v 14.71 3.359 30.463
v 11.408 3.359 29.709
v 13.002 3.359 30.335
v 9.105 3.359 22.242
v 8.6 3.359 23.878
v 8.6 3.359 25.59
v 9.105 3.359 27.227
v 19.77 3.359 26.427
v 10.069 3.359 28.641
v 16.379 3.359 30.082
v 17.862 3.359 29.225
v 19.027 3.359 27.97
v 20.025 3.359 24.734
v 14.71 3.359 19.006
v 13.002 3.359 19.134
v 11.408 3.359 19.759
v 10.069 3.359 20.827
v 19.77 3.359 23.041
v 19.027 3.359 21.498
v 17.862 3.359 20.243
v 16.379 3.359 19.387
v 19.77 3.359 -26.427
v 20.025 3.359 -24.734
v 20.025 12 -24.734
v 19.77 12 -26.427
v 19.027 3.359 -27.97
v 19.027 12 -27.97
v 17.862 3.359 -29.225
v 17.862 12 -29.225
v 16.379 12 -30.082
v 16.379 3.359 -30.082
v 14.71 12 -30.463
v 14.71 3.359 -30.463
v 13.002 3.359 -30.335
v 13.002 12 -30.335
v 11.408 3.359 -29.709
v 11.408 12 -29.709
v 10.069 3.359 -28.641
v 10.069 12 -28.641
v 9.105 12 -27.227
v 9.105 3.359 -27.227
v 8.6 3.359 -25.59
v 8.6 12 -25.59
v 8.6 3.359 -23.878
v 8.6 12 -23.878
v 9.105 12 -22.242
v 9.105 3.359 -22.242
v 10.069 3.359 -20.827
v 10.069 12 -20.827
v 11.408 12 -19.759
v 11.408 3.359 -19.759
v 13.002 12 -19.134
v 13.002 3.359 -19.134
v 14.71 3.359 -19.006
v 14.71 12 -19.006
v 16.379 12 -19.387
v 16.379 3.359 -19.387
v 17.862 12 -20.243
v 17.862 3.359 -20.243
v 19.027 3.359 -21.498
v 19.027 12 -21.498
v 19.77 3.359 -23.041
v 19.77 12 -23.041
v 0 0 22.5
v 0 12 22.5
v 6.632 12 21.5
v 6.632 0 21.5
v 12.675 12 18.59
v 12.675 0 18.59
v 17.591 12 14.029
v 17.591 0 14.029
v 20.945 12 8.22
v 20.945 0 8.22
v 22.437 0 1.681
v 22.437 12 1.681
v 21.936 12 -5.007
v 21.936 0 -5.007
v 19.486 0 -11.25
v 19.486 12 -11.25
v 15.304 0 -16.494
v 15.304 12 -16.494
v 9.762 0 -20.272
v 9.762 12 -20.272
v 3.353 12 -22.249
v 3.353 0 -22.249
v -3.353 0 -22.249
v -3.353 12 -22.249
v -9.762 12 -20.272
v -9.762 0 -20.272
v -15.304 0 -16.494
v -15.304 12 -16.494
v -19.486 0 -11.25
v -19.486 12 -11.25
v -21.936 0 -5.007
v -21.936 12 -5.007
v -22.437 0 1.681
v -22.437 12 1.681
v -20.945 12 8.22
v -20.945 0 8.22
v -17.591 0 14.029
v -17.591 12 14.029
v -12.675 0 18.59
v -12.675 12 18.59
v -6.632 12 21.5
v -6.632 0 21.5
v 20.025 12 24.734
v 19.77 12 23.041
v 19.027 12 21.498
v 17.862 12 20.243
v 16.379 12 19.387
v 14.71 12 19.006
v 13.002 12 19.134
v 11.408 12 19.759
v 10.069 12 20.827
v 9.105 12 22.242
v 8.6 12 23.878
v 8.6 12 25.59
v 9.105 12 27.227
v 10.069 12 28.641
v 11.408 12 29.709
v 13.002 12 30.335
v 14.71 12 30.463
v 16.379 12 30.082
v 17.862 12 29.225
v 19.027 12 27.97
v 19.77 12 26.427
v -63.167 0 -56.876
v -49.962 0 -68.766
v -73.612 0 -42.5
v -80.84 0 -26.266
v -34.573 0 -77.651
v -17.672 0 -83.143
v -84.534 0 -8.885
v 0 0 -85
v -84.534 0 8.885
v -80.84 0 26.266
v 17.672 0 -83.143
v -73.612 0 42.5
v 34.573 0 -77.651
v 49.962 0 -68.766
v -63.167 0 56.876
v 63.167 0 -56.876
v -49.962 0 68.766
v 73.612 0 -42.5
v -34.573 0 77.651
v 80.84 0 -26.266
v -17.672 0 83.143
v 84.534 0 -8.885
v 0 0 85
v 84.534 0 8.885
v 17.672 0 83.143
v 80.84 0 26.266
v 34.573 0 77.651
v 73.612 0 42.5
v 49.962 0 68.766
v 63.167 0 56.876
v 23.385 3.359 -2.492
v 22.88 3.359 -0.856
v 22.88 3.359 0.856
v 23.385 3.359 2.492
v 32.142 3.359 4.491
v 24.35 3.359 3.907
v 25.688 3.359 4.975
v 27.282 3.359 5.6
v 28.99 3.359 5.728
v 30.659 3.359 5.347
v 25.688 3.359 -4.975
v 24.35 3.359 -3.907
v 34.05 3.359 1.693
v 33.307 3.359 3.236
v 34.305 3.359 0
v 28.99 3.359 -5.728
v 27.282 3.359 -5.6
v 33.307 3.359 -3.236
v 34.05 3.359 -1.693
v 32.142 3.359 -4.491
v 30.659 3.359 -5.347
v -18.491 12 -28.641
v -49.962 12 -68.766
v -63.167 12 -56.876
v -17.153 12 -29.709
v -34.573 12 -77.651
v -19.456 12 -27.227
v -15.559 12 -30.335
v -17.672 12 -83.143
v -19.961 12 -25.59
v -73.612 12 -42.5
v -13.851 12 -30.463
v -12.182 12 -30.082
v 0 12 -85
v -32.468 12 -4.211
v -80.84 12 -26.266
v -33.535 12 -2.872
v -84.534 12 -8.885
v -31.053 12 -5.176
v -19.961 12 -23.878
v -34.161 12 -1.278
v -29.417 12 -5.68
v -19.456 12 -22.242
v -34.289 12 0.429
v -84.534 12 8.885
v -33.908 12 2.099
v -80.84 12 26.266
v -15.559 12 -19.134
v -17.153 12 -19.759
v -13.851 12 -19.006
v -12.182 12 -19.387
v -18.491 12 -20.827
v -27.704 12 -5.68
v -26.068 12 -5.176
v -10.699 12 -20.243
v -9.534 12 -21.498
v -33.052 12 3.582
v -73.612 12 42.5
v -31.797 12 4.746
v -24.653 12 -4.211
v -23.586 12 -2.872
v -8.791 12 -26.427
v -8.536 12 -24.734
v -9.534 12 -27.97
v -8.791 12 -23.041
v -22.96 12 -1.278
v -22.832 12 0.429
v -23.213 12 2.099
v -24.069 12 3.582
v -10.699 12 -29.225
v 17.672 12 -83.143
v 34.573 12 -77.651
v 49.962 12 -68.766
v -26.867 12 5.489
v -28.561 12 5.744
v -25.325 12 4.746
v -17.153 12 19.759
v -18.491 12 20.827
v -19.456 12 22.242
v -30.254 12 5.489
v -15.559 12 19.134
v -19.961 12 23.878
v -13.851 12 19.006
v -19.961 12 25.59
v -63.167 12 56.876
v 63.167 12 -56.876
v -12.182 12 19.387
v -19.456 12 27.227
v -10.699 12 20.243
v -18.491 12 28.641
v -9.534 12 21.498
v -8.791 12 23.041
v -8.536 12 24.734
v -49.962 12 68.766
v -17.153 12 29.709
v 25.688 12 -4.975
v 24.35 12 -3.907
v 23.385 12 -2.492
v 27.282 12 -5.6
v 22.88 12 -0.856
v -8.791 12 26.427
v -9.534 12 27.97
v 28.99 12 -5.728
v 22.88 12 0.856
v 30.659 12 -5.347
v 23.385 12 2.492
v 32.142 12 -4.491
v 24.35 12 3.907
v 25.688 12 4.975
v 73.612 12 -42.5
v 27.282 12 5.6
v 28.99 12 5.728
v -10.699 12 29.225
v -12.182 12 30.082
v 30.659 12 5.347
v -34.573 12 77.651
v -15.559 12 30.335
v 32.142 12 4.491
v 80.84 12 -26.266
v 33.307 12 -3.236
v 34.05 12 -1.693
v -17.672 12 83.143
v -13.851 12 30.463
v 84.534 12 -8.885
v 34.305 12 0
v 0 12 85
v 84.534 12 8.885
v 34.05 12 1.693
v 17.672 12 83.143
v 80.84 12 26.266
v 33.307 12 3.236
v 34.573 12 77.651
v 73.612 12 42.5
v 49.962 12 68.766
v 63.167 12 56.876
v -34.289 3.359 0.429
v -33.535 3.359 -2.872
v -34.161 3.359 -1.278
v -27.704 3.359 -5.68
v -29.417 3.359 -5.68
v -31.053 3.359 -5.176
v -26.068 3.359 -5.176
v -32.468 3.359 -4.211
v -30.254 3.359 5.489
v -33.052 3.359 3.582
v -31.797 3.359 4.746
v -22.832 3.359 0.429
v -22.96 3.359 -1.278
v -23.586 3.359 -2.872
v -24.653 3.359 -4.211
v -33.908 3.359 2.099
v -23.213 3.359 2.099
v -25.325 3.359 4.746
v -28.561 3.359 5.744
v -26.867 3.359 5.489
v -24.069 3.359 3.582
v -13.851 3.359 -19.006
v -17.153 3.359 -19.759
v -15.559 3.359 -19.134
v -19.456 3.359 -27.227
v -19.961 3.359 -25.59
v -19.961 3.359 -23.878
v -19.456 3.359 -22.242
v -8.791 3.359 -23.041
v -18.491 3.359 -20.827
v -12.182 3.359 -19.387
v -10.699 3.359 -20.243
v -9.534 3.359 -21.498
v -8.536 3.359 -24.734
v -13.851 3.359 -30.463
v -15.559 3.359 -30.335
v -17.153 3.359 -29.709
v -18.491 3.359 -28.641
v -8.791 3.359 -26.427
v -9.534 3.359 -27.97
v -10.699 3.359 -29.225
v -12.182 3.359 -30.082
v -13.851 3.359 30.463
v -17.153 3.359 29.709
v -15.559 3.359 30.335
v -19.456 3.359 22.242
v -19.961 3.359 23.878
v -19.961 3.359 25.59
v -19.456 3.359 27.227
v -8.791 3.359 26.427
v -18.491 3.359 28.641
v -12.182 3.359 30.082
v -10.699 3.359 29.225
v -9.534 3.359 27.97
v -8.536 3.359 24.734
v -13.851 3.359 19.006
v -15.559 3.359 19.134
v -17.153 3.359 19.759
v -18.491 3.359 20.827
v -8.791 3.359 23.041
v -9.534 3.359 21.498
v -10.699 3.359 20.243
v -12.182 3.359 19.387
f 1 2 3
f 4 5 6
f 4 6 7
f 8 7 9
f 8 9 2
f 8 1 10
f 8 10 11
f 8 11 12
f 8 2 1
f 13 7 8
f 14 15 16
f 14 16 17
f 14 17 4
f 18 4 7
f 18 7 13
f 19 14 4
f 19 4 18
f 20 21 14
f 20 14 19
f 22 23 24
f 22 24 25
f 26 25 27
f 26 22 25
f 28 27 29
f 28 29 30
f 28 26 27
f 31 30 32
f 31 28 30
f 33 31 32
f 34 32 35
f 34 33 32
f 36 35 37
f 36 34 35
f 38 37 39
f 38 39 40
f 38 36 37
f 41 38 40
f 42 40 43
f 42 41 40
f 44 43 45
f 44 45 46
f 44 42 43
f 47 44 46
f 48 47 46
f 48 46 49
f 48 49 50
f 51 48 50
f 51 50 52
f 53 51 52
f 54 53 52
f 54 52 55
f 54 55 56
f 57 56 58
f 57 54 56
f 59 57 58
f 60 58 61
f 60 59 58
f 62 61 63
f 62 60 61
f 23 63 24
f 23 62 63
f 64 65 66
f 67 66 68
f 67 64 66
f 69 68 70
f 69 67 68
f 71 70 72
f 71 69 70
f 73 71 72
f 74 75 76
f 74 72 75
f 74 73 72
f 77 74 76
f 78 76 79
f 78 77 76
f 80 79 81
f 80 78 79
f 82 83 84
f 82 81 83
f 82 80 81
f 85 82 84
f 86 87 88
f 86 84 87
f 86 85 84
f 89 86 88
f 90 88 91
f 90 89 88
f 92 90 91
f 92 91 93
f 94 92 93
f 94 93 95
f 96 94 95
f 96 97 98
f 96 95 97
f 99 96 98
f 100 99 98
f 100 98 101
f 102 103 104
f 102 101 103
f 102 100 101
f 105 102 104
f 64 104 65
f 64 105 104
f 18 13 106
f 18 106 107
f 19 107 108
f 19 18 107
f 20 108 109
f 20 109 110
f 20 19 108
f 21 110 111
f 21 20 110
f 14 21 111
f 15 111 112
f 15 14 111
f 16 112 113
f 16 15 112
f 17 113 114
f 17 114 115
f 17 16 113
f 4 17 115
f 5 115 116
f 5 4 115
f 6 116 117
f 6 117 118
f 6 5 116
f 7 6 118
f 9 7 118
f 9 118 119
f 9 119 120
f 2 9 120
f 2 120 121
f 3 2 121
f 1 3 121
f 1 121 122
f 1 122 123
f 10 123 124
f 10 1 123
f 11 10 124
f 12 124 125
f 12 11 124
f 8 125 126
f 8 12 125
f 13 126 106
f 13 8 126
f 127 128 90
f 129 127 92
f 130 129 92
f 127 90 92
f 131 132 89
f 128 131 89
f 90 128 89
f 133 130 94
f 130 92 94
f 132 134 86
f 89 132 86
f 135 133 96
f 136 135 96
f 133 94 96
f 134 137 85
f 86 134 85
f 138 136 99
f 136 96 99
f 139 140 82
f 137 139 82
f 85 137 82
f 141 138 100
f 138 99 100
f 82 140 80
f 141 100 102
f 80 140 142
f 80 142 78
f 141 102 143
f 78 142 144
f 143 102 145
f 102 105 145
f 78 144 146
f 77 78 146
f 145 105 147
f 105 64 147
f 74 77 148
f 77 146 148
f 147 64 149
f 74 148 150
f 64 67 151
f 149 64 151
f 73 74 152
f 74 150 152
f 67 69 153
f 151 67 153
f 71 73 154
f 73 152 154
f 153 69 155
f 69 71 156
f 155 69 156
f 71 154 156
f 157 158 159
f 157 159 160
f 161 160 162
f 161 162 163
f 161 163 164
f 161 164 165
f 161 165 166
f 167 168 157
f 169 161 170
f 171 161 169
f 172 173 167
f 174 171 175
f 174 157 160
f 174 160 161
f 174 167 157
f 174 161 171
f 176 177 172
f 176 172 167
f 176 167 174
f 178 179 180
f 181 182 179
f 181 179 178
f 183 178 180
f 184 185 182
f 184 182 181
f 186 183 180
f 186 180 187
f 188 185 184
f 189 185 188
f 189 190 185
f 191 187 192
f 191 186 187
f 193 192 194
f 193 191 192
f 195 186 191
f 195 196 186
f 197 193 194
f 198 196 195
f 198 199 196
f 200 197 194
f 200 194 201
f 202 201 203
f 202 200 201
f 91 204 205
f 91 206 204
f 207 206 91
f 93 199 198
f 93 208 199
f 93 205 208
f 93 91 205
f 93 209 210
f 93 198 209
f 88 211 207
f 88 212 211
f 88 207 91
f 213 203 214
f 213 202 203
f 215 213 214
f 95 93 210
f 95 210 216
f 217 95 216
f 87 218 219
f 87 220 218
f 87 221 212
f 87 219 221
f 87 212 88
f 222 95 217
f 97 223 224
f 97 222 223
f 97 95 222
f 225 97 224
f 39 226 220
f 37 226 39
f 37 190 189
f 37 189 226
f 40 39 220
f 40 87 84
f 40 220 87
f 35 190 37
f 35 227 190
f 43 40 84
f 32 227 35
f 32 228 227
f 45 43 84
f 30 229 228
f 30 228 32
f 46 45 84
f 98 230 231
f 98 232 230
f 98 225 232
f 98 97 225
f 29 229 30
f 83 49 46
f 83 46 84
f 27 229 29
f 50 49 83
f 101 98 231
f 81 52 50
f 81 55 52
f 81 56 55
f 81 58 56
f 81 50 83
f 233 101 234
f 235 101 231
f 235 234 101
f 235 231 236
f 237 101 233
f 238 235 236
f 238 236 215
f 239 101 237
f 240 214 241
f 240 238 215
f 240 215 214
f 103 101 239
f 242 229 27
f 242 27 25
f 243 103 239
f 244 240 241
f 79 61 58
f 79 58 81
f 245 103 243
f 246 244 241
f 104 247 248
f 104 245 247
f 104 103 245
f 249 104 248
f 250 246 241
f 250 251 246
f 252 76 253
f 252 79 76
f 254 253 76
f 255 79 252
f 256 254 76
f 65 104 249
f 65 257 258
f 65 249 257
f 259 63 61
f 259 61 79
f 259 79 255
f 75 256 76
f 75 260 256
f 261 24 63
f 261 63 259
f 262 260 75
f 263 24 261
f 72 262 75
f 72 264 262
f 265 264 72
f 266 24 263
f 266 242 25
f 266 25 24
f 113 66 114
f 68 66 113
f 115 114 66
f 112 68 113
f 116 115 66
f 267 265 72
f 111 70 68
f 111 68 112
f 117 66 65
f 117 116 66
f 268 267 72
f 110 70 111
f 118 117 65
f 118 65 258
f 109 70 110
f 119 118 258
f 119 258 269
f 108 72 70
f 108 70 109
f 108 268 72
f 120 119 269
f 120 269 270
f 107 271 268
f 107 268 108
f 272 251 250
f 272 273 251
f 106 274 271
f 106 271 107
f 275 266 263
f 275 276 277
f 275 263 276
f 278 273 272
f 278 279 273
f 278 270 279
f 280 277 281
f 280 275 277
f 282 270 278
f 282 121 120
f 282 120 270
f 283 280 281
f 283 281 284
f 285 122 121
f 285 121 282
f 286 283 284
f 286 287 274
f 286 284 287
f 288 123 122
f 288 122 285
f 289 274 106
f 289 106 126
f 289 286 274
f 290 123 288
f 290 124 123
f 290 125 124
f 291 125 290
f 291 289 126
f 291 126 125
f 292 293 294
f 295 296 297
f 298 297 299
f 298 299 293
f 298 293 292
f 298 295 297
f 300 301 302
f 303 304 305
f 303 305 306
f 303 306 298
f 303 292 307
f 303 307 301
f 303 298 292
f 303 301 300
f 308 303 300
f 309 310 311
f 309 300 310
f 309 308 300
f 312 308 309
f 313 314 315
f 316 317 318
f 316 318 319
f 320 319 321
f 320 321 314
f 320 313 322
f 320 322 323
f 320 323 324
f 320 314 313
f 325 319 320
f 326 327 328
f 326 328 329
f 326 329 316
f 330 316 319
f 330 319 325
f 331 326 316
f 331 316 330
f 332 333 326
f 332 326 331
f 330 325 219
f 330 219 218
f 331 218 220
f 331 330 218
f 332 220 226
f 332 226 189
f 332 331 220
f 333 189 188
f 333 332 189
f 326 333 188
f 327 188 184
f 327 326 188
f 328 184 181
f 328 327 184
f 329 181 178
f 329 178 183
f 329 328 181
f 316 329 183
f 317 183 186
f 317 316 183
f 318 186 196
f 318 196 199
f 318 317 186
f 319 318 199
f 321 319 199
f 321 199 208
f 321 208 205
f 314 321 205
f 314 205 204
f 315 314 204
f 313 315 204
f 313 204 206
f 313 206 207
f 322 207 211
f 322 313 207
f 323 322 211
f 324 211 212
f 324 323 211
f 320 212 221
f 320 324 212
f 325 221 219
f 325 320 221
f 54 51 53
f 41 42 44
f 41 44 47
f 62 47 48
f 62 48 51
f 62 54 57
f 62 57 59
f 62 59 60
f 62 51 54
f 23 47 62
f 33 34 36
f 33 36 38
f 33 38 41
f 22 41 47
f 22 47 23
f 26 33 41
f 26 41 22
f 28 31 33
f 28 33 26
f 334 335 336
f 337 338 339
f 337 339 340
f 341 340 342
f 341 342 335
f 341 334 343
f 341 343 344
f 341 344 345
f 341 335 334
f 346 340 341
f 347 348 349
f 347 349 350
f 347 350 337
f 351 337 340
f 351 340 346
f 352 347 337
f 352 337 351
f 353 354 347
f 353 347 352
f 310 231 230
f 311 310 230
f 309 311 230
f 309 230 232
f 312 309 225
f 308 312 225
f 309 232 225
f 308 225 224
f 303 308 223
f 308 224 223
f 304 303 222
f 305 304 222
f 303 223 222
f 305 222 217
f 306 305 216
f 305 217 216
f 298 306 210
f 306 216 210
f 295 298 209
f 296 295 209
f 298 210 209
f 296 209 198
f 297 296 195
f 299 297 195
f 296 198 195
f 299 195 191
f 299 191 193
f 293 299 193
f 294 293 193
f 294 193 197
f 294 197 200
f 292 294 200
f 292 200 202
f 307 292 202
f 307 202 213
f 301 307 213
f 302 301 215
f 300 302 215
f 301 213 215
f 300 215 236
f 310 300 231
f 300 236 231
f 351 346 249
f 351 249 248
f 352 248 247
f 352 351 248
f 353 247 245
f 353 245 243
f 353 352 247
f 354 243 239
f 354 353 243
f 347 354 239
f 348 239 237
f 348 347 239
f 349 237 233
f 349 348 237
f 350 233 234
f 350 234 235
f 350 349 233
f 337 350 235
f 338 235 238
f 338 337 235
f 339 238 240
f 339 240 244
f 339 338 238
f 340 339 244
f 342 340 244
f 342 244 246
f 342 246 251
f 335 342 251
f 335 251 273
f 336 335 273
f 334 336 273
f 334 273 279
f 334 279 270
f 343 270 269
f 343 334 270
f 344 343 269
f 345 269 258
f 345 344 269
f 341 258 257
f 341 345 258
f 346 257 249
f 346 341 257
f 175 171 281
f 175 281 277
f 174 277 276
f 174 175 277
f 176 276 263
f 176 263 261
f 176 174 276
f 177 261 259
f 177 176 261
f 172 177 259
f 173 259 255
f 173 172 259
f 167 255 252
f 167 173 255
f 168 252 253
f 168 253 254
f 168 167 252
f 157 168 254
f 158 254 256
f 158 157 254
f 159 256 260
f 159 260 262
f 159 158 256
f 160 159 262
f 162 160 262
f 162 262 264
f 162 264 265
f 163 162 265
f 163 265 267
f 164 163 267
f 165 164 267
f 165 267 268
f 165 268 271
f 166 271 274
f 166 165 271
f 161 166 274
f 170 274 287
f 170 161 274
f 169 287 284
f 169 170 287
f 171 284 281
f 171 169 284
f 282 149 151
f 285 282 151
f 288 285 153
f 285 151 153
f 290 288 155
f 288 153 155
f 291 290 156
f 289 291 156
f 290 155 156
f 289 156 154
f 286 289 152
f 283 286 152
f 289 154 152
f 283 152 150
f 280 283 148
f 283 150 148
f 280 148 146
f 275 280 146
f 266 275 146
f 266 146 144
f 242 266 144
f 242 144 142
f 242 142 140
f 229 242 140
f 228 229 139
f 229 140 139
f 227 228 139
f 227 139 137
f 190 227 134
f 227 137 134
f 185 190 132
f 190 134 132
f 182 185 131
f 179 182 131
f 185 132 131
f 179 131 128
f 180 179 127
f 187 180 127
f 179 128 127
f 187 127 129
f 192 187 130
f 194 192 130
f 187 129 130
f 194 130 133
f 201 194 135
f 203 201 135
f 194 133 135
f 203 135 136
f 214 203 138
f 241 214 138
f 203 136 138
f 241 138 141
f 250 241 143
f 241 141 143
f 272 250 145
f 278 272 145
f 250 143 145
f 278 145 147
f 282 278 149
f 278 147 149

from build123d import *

# Parameters (mm, degrees)
SKETCH1_R           = 85
BOSS_EXTRUDE1_DEPTH = 12
SKETCH2_R           = 22.5
CUT_EXTRUDE1_DEPTH  = 121.805629008
SKETCH3_R           = 5.744458378
CUT_EXTRUDE2_DEPTH  = 8.640705881
CIRPATTERN1_COUNT   = 6


with BuildPart() as part:
    # Sketch1 → Boss-Extrude1 (new body)
    with BuildSketch(Plane(origin=(0, 0, 0), x_dir=(1, 0, 0), z_dir=(0, 1, 0))):
        Circle(SKETCH1_R)
    extrude(amount=BOSS_EXTRUDE1_DEPTH)

    # Sketch2 → Cut-Extrude1 (cut, through all)
    with BuildSketch(Plane(origin=(0, 0, 0), x_dir=(1, 0, 0), z_dir=(0, 1, 0))):
        Circle(SKETCH2_R)
    extrude(amount=CUT_EXTRUDE1_DEPTH, mode=Mode.SUBTRACT)

    # Sketch3 → Cut-Extrude2 (cut)
    with BuildSketch(Plane(origin=(0, 12, 0), x_dir=(1, 0, 0), z_dir=(0, 1, 0))):
        with Locations((-28.560637046, 0)):
            Circle(SKETCH3_R)
    cut_extrude2 = extrude(amount=-CUT_EXTRUDE2_DEPTH, mode=Mode.SUBTRACT)

    # CirPattern1: Cut-Extrude2 ×6 about axis
    cirpattern1_axis = Axis((0, 0, 0), (0, 1, 0))
    for i in range(1, CIRPATTERN1_COUNT):
        add(cut_extrude2.rotate(cirpattern1_axis, i * 360 / CIRPATTERN1_COUNT), mode=Mode.SUBTRACT)


solid = part.part
